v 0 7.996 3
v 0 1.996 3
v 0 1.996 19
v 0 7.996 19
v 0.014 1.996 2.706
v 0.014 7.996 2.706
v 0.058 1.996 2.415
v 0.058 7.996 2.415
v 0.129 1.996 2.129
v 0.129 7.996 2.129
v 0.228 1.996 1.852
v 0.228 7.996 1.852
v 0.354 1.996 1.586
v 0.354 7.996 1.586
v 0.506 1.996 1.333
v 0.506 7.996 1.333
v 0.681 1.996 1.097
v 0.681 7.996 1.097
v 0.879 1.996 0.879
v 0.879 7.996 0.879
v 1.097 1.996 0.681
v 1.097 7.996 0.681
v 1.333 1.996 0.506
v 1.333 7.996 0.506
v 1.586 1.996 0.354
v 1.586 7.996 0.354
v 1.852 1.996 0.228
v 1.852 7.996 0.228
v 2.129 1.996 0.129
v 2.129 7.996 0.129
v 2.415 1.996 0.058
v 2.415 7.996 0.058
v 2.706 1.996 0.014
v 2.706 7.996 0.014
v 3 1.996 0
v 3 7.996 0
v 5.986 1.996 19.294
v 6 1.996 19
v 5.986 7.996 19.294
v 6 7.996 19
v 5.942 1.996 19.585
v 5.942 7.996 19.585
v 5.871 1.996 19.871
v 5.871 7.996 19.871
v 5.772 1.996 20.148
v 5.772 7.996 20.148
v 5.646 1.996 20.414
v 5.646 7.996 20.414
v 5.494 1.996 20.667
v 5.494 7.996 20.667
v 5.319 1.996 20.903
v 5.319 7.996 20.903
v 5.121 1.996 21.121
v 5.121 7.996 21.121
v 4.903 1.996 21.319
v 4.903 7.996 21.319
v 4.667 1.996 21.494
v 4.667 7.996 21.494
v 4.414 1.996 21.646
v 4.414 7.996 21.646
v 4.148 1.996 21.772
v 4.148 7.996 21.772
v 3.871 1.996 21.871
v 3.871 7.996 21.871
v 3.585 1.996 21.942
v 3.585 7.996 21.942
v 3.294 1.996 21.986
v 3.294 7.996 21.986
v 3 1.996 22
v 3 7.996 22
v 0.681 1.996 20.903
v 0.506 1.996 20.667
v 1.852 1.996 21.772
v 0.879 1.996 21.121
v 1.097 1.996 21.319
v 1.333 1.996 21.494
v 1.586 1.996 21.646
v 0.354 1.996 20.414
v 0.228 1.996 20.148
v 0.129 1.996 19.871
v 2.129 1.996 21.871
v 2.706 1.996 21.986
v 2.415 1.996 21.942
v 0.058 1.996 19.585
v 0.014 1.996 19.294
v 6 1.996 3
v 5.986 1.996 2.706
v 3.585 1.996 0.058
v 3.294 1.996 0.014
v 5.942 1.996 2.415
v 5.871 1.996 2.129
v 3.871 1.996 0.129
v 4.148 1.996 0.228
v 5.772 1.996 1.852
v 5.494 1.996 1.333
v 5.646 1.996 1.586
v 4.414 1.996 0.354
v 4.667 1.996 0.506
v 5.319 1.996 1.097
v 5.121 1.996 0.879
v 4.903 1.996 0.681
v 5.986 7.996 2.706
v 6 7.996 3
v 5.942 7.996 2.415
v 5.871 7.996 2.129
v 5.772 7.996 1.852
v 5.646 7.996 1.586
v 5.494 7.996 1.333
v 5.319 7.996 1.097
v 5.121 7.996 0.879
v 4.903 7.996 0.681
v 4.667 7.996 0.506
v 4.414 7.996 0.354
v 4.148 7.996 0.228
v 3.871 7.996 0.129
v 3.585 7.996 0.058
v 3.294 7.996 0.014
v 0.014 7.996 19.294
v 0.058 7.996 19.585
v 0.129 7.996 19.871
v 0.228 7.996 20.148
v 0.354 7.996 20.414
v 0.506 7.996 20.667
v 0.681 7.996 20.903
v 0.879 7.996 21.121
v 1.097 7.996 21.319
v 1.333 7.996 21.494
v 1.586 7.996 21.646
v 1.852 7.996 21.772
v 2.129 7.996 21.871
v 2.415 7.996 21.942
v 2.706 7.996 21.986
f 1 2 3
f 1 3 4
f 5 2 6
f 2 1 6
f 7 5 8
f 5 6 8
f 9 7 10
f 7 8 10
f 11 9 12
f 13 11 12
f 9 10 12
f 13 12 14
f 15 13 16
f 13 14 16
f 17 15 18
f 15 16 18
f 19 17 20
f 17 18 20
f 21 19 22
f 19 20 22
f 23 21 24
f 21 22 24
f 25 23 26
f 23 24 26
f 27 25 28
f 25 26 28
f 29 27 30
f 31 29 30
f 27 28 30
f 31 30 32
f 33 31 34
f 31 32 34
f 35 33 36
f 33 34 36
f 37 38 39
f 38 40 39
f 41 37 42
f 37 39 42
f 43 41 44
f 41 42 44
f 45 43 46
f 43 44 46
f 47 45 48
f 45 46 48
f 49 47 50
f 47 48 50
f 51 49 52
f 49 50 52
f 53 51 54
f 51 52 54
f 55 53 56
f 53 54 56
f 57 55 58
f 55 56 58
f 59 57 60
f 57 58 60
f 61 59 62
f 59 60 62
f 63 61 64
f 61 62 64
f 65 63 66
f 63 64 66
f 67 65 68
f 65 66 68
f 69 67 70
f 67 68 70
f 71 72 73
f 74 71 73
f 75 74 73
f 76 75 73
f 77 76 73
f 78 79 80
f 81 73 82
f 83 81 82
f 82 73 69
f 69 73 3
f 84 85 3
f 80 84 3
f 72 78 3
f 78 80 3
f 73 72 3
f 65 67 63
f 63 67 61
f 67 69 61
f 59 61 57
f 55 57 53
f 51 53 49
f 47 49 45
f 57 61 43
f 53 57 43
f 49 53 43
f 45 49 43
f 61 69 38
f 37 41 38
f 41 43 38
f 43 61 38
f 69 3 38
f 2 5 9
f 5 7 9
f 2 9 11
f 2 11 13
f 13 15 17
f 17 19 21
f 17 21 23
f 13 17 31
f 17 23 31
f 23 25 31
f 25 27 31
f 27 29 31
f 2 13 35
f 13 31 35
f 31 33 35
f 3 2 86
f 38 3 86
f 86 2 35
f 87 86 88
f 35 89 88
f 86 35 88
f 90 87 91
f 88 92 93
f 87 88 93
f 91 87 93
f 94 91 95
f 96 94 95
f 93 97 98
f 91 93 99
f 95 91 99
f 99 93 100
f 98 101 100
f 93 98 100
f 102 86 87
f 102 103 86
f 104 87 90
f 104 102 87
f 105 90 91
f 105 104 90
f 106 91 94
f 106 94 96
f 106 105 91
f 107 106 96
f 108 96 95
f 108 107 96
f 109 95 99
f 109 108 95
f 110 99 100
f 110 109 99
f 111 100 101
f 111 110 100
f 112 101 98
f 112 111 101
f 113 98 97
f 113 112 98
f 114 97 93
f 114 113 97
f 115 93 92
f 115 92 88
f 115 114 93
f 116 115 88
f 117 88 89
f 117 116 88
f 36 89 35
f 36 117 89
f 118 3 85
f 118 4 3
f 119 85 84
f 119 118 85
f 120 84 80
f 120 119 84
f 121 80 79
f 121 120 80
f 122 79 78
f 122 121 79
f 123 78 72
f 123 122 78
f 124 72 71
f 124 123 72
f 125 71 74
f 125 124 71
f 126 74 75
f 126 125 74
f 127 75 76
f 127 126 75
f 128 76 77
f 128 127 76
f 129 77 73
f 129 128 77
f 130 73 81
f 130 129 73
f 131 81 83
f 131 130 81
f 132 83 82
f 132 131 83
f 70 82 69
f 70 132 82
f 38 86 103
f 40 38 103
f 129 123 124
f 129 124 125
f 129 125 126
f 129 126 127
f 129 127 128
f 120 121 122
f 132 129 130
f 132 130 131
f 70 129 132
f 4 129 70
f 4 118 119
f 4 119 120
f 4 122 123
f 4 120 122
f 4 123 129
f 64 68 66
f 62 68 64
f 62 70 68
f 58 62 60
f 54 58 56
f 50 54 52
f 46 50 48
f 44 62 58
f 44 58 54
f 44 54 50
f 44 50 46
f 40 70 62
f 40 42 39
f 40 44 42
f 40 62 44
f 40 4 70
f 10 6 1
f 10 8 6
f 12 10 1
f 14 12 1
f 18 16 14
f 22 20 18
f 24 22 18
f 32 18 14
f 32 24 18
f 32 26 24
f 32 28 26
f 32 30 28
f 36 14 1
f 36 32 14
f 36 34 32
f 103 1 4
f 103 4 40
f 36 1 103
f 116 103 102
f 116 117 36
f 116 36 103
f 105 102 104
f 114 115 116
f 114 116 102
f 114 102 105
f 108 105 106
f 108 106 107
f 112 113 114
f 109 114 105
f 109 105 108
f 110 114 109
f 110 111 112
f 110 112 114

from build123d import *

# Parameters (mm, degrees)
SKETCH1_W      = 6
SKETCH1_H      = 6
EXTRUDE1_DEPTH = 22
FILLET1_R      = 3


with BuildPart() as part:
    # Sketch1 → Extrude1 (new body)
    with BuildSketch(Plane.XY):
        with Locations((3, 4.996296296)):
            Rectangle(SKETCH1_W, SKETCH1_H)
    extrude(amount=EXTRUDE1_DEPTH)

    # Fillet1
    fillet1_edges = [part.edges().sort_by_distance(p)[0] for p in [
        (6, 4.996296296, 22),
        (0, 4.996296296, 22),
        (0, 4.996296296, 0),
        (6, 4.996296296, 0),
    ]]
    fillet(fillet1_edges, radius=FILLET1_R - 0.0001)  # a hair under: the kernel refuses the full size


solid = part.part
